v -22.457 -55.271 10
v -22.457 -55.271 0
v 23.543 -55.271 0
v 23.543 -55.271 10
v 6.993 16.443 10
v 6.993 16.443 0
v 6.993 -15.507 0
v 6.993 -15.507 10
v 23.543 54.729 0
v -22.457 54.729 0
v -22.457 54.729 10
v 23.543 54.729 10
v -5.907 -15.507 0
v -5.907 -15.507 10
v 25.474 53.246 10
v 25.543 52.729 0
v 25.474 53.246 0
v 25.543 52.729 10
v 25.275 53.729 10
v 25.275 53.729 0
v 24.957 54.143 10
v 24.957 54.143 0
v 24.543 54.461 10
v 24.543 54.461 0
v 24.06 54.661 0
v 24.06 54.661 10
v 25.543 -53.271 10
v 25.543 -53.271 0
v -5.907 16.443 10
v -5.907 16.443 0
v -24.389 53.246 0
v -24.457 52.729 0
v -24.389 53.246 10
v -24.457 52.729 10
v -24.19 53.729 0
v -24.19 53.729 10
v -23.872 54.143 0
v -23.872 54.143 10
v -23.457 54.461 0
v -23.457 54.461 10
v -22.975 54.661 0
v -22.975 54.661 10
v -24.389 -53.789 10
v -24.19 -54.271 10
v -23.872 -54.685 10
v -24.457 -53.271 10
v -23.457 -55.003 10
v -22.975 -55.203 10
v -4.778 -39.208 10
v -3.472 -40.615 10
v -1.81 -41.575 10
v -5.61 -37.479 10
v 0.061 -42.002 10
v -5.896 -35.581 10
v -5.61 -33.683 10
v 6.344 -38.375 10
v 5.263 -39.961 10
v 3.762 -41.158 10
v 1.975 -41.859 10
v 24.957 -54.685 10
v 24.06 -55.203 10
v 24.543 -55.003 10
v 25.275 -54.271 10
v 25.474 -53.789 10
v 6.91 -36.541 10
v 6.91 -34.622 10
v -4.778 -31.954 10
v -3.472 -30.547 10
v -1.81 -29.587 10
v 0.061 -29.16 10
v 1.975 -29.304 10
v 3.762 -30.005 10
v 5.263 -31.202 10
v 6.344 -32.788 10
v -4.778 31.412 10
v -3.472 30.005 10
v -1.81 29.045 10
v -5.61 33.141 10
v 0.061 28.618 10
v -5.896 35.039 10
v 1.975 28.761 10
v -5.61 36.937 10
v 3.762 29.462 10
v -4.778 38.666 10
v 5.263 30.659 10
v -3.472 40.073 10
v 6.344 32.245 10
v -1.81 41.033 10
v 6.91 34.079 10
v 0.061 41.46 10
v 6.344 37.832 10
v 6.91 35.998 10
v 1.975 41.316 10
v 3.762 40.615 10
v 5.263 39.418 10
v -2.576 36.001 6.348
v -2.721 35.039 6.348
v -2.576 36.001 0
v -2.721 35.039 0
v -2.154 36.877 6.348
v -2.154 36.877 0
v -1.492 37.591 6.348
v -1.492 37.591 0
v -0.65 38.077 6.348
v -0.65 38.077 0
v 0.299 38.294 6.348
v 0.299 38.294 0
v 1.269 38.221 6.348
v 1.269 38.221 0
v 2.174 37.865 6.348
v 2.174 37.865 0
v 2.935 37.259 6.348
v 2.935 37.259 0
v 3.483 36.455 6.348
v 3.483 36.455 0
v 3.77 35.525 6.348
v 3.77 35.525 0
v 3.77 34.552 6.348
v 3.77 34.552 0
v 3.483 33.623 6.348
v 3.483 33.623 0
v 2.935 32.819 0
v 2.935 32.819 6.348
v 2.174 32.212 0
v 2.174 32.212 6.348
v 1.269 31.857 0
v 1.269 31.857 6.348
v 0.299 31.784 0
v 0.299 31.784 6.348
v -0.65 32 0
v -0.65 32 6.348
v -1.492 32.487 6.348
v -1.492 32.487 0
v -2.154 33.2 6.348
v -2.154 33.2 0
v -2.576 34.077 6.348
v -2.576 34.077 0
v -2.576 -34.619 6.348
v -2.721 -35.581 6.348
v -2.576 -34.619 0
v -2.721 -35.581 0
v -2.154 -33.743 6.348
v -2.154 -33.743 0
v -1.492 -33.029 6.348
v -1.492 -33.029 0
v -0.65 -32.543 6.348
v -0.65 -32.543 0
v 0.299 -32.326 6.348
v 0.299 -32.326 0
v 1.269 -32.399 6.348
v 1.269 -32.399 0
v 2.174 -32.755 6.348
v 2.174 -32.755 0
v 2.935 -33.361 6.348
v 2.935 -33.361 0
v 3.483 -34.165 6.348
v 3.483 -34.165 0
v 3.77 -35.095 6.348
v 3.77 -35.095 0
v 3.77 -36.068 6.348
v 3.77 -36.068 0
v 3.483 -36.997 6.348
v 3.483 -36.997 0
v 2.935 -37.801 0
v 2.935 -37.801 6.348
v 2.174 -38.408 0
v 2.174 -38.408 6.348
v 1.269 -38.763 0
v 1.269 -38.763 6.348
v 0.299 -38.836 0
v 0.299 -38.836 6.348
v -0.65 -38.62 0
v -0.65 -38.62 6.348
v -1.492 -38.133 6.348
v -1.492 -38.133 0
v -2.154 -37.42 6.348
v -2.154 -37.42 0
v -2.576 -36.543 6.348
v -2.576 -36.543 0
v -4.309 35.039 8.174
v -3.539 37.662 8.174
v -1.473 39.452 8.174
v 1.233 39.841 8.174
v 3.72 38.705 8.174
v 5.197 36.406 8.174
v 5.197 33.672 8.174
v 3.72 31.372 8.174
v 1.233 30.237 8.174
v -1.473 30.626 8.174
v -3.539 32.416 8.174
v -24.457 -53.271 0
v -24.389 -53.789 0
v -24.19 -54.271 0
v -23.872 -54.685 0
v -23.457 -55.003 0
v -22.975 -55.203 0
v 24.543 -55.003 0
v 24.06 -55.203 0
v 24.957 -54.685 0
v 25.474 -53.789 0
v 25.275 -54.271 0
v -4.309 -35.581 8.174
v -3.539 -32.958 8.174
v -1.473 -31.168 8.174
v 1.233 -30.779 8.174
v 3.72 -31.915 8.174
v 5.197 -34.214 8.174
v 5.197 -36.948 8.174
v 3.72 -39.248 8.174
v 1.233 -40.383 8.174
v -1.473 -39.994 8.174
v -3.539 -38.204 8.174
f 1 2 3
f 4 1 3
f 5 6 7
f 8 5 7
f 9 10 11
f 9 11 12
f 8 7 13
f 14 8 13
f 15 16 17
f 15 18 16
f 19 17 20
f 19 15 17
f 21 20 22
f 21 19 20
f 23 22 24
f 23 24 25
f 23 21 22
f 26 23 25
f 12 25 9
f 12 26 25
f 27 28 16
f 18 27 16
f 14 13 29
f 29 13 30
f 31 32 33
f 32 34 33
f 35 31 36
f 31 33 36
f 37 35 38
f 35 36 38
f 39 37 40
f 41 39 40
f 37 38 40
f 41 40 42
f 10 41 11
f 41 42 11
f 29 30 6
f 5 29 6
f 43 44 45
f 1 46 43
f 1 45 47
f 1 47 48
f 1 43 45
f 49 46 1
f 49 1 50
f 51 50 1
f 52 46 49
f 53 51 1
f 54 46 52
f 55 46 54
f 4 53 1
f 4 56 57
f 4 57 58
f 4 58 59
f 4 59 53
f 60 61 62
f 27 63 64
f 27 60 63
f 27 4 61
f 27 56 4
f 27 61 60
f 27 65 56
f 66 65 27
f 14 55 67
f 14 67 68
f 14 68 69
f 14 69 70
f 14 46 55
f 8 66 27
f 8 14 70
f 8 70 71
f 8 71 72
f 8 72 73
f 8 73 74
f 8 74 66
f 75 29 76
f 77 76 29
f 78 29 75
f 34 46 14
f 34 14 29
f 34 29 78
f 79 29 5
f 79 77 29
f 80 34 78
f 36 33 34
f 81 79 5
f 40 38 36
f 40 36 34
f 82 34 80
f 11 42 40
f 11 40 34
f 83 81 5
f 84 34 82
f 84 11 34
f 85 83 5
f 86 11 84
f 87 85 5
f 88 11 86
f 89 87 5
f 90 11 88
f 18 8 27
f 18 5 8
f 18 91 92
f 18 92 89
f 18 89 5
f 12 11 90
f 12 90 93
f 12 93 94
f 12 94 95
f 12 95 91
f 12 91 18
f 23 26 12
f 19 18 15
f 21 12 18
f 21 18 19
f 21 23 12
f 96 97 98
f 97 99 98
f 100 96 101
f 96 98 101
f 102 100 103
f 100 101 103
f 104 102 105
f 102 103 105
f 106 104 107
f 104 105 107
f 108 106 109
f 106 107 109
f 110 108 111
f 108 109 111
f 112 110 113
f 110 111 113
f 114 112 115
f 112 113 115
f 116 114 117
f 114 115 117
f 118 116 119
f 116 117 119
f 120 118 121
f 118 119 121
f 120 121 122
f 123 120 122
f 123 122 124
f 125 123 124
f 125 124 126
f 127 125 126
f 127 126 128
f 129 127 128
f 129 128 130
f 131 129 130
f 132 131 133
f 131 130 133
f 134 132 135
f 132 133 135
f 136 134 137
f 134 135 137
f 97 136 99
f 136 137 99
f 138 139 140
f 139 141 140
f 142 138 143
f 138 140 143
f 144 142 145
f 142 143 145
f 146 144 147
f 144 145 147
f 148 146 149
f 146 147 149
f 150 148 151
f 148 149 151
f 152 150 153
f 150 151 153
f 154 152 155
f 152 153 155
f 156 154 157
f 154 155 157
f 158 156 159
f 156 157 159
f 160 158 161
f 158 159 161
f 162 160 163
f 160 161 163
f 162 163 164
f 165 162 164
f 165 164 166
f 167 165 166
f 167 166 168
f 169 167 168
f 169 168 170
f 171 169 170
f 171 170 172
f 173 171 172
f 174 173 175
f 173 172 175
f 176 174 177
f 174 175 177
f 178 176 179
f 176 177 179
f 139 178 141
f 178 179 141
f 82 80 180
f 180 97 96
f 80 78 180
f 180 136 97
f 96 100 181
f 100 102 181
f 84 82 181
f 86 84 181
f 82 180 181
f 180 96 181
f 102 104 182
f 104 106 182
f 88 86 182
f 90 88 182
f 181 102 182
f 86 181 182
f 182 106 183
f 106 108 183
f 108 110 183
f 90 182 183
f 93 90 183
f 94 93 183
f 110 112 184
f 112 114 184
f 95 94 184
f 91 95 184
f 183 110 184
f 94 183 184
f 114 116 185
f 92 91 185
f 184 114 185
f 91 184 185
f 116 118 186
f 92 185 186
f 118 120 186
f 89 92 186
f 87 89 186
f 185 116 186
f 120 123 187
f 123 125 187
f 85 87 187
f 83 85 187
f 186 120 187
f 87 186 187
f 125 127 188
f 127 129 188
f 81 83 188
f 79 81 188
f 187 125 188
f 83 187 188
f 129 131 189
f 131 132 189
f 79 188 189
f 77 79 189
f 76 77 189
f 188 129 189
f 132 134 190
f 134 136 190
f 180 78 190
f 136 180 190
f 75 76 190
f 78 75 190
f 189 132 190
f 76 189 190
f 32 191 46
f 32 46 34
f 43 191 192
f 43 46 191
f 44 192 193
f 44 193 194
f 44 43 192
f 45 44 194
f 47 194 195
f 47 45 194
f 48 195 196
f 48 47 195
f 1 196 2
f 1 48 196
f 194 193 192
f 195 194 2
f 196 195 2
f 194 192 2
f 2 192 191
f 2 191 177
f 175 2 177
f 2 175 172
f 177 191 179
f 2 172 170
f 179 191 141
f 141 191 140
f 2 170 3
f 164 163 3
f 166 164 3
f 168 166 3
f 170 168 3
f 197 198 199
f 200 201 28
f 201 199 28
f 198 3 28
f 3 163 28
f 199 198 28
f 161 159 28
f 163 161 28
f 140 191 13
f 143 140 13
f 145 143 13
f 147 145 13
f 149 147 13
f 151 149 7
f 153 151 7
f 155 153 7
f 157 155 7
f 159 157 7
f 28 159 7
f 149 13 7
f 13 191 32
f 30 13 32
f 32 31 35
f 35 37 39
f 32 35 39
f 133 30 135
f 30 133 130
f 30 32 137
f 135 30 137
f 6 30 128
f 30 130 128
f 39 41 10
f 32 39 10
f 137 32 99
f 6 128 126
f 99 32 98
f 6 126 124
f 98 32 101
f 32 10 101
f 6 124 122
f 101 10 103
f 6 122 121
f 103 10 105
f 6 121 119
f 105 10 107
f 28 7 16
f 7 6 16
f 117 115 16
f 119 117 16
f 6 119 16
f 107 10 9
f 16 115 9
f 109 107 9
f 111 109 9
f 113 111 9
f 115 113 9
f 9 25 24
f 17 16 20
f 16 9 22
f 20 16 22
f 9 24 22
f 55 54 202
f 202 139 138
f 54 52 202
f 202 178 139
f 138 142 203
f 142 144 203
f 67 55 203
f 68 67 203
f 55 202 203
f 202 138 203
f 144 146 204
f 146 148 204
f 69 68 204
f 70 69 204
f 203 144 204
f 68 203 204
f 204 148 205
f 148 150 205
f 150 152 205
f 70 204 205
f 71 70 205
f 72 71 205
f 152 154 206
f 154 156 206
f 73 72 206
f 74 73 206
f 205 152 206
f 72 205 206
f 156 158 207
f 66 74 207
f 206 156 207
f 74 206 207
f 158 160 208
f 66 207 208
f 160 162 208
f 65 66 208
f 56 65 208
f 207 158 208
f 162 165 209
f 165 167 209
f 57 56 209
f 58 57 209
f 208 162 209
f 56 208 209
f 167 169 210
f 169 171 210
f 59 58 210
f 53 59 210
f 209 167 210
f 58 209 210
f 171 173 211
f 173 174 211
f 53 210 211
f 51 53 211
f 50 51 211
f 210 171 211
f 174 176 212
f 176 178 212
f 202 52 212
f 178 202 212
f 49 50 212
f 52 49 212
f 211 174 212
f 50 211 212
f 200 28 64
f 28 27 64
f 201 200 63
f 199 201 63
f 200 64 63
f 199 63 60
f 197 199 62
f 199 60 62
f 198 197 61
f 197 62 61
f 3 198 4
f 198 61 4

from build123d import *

# Parameters (mm, degrees)
SKETCH1_W                                        = 50
SKETCH1_H                                        = 110
BOSS_EXTRUDE1_DEPTH                              = 10
CSK_FOR_1_4_FLAT_HEAD_MACHINE_SCREW1_D           = 6.5278
CSK_FOR_1_4_FLAT_HEAD_MACHINE_SCREW1_CSINK_D     = 12.8778
CSK_FOR_1_4_FLAT_HEAD_MACHINE_SCREW1_CSINK_ANGLE = 82
FILLET1_R                                        = 2


with BuildPart() as part:
    # Sketch1 → Boss-Extrude1 (new body)
    with BuildSketch(Plane.XY):
        with Locations((0.542522126, -0.271261063)):
            Rectangle(SKETCH1_W, SKETCH1_H)
        Polygon((0.542522126, 16.44340804), (6.992522126, 16.44340804), (6.992522126, -15.50659196), (0.542522126, -15.50659196), (-5.907477874, -15.50659196), (-5.907477874, 16.44340804), align=None, mode=Mode.SUBTRACT)
    extrude(amount=BOSS_EXTRUDE1_DEPTH)

    # CSK for 1/4 Flat Head Machine Screw1 (through all)
    with Locations(Plane.XY.offset(10)):
        with Locations((0.542522126, -35.581261063), (0.542522126, 35.038738937)):
            CounterSinkHole(CSK_FOR_1_4_FLAT_HEAD_MACHINE_SCREW1_D / 2, CSK_FOR_1_4_FLAT_HEAD_MACHINE_SCREW1_CSINK_D / 2, counter_sink_angle=CSK_FOR_1_4_FLAT_HEAD_MACHINE_SCREW1_CSINK_ANGLE)

    # Fillet1
    fillet1_edges = [part.edges().sort_by_distance(p)[0] for p in [
        (-24.457477874, 54.728738937, 5),
        (25.542522126, 54.728738937, 5),
        (25.542522126, -55.271261063, 5),
        (-24.457477874, -55.271261063, 5),
    ]]
    fillet(fillet1_edges, radius=FILLET1_R)


solid = part.part
